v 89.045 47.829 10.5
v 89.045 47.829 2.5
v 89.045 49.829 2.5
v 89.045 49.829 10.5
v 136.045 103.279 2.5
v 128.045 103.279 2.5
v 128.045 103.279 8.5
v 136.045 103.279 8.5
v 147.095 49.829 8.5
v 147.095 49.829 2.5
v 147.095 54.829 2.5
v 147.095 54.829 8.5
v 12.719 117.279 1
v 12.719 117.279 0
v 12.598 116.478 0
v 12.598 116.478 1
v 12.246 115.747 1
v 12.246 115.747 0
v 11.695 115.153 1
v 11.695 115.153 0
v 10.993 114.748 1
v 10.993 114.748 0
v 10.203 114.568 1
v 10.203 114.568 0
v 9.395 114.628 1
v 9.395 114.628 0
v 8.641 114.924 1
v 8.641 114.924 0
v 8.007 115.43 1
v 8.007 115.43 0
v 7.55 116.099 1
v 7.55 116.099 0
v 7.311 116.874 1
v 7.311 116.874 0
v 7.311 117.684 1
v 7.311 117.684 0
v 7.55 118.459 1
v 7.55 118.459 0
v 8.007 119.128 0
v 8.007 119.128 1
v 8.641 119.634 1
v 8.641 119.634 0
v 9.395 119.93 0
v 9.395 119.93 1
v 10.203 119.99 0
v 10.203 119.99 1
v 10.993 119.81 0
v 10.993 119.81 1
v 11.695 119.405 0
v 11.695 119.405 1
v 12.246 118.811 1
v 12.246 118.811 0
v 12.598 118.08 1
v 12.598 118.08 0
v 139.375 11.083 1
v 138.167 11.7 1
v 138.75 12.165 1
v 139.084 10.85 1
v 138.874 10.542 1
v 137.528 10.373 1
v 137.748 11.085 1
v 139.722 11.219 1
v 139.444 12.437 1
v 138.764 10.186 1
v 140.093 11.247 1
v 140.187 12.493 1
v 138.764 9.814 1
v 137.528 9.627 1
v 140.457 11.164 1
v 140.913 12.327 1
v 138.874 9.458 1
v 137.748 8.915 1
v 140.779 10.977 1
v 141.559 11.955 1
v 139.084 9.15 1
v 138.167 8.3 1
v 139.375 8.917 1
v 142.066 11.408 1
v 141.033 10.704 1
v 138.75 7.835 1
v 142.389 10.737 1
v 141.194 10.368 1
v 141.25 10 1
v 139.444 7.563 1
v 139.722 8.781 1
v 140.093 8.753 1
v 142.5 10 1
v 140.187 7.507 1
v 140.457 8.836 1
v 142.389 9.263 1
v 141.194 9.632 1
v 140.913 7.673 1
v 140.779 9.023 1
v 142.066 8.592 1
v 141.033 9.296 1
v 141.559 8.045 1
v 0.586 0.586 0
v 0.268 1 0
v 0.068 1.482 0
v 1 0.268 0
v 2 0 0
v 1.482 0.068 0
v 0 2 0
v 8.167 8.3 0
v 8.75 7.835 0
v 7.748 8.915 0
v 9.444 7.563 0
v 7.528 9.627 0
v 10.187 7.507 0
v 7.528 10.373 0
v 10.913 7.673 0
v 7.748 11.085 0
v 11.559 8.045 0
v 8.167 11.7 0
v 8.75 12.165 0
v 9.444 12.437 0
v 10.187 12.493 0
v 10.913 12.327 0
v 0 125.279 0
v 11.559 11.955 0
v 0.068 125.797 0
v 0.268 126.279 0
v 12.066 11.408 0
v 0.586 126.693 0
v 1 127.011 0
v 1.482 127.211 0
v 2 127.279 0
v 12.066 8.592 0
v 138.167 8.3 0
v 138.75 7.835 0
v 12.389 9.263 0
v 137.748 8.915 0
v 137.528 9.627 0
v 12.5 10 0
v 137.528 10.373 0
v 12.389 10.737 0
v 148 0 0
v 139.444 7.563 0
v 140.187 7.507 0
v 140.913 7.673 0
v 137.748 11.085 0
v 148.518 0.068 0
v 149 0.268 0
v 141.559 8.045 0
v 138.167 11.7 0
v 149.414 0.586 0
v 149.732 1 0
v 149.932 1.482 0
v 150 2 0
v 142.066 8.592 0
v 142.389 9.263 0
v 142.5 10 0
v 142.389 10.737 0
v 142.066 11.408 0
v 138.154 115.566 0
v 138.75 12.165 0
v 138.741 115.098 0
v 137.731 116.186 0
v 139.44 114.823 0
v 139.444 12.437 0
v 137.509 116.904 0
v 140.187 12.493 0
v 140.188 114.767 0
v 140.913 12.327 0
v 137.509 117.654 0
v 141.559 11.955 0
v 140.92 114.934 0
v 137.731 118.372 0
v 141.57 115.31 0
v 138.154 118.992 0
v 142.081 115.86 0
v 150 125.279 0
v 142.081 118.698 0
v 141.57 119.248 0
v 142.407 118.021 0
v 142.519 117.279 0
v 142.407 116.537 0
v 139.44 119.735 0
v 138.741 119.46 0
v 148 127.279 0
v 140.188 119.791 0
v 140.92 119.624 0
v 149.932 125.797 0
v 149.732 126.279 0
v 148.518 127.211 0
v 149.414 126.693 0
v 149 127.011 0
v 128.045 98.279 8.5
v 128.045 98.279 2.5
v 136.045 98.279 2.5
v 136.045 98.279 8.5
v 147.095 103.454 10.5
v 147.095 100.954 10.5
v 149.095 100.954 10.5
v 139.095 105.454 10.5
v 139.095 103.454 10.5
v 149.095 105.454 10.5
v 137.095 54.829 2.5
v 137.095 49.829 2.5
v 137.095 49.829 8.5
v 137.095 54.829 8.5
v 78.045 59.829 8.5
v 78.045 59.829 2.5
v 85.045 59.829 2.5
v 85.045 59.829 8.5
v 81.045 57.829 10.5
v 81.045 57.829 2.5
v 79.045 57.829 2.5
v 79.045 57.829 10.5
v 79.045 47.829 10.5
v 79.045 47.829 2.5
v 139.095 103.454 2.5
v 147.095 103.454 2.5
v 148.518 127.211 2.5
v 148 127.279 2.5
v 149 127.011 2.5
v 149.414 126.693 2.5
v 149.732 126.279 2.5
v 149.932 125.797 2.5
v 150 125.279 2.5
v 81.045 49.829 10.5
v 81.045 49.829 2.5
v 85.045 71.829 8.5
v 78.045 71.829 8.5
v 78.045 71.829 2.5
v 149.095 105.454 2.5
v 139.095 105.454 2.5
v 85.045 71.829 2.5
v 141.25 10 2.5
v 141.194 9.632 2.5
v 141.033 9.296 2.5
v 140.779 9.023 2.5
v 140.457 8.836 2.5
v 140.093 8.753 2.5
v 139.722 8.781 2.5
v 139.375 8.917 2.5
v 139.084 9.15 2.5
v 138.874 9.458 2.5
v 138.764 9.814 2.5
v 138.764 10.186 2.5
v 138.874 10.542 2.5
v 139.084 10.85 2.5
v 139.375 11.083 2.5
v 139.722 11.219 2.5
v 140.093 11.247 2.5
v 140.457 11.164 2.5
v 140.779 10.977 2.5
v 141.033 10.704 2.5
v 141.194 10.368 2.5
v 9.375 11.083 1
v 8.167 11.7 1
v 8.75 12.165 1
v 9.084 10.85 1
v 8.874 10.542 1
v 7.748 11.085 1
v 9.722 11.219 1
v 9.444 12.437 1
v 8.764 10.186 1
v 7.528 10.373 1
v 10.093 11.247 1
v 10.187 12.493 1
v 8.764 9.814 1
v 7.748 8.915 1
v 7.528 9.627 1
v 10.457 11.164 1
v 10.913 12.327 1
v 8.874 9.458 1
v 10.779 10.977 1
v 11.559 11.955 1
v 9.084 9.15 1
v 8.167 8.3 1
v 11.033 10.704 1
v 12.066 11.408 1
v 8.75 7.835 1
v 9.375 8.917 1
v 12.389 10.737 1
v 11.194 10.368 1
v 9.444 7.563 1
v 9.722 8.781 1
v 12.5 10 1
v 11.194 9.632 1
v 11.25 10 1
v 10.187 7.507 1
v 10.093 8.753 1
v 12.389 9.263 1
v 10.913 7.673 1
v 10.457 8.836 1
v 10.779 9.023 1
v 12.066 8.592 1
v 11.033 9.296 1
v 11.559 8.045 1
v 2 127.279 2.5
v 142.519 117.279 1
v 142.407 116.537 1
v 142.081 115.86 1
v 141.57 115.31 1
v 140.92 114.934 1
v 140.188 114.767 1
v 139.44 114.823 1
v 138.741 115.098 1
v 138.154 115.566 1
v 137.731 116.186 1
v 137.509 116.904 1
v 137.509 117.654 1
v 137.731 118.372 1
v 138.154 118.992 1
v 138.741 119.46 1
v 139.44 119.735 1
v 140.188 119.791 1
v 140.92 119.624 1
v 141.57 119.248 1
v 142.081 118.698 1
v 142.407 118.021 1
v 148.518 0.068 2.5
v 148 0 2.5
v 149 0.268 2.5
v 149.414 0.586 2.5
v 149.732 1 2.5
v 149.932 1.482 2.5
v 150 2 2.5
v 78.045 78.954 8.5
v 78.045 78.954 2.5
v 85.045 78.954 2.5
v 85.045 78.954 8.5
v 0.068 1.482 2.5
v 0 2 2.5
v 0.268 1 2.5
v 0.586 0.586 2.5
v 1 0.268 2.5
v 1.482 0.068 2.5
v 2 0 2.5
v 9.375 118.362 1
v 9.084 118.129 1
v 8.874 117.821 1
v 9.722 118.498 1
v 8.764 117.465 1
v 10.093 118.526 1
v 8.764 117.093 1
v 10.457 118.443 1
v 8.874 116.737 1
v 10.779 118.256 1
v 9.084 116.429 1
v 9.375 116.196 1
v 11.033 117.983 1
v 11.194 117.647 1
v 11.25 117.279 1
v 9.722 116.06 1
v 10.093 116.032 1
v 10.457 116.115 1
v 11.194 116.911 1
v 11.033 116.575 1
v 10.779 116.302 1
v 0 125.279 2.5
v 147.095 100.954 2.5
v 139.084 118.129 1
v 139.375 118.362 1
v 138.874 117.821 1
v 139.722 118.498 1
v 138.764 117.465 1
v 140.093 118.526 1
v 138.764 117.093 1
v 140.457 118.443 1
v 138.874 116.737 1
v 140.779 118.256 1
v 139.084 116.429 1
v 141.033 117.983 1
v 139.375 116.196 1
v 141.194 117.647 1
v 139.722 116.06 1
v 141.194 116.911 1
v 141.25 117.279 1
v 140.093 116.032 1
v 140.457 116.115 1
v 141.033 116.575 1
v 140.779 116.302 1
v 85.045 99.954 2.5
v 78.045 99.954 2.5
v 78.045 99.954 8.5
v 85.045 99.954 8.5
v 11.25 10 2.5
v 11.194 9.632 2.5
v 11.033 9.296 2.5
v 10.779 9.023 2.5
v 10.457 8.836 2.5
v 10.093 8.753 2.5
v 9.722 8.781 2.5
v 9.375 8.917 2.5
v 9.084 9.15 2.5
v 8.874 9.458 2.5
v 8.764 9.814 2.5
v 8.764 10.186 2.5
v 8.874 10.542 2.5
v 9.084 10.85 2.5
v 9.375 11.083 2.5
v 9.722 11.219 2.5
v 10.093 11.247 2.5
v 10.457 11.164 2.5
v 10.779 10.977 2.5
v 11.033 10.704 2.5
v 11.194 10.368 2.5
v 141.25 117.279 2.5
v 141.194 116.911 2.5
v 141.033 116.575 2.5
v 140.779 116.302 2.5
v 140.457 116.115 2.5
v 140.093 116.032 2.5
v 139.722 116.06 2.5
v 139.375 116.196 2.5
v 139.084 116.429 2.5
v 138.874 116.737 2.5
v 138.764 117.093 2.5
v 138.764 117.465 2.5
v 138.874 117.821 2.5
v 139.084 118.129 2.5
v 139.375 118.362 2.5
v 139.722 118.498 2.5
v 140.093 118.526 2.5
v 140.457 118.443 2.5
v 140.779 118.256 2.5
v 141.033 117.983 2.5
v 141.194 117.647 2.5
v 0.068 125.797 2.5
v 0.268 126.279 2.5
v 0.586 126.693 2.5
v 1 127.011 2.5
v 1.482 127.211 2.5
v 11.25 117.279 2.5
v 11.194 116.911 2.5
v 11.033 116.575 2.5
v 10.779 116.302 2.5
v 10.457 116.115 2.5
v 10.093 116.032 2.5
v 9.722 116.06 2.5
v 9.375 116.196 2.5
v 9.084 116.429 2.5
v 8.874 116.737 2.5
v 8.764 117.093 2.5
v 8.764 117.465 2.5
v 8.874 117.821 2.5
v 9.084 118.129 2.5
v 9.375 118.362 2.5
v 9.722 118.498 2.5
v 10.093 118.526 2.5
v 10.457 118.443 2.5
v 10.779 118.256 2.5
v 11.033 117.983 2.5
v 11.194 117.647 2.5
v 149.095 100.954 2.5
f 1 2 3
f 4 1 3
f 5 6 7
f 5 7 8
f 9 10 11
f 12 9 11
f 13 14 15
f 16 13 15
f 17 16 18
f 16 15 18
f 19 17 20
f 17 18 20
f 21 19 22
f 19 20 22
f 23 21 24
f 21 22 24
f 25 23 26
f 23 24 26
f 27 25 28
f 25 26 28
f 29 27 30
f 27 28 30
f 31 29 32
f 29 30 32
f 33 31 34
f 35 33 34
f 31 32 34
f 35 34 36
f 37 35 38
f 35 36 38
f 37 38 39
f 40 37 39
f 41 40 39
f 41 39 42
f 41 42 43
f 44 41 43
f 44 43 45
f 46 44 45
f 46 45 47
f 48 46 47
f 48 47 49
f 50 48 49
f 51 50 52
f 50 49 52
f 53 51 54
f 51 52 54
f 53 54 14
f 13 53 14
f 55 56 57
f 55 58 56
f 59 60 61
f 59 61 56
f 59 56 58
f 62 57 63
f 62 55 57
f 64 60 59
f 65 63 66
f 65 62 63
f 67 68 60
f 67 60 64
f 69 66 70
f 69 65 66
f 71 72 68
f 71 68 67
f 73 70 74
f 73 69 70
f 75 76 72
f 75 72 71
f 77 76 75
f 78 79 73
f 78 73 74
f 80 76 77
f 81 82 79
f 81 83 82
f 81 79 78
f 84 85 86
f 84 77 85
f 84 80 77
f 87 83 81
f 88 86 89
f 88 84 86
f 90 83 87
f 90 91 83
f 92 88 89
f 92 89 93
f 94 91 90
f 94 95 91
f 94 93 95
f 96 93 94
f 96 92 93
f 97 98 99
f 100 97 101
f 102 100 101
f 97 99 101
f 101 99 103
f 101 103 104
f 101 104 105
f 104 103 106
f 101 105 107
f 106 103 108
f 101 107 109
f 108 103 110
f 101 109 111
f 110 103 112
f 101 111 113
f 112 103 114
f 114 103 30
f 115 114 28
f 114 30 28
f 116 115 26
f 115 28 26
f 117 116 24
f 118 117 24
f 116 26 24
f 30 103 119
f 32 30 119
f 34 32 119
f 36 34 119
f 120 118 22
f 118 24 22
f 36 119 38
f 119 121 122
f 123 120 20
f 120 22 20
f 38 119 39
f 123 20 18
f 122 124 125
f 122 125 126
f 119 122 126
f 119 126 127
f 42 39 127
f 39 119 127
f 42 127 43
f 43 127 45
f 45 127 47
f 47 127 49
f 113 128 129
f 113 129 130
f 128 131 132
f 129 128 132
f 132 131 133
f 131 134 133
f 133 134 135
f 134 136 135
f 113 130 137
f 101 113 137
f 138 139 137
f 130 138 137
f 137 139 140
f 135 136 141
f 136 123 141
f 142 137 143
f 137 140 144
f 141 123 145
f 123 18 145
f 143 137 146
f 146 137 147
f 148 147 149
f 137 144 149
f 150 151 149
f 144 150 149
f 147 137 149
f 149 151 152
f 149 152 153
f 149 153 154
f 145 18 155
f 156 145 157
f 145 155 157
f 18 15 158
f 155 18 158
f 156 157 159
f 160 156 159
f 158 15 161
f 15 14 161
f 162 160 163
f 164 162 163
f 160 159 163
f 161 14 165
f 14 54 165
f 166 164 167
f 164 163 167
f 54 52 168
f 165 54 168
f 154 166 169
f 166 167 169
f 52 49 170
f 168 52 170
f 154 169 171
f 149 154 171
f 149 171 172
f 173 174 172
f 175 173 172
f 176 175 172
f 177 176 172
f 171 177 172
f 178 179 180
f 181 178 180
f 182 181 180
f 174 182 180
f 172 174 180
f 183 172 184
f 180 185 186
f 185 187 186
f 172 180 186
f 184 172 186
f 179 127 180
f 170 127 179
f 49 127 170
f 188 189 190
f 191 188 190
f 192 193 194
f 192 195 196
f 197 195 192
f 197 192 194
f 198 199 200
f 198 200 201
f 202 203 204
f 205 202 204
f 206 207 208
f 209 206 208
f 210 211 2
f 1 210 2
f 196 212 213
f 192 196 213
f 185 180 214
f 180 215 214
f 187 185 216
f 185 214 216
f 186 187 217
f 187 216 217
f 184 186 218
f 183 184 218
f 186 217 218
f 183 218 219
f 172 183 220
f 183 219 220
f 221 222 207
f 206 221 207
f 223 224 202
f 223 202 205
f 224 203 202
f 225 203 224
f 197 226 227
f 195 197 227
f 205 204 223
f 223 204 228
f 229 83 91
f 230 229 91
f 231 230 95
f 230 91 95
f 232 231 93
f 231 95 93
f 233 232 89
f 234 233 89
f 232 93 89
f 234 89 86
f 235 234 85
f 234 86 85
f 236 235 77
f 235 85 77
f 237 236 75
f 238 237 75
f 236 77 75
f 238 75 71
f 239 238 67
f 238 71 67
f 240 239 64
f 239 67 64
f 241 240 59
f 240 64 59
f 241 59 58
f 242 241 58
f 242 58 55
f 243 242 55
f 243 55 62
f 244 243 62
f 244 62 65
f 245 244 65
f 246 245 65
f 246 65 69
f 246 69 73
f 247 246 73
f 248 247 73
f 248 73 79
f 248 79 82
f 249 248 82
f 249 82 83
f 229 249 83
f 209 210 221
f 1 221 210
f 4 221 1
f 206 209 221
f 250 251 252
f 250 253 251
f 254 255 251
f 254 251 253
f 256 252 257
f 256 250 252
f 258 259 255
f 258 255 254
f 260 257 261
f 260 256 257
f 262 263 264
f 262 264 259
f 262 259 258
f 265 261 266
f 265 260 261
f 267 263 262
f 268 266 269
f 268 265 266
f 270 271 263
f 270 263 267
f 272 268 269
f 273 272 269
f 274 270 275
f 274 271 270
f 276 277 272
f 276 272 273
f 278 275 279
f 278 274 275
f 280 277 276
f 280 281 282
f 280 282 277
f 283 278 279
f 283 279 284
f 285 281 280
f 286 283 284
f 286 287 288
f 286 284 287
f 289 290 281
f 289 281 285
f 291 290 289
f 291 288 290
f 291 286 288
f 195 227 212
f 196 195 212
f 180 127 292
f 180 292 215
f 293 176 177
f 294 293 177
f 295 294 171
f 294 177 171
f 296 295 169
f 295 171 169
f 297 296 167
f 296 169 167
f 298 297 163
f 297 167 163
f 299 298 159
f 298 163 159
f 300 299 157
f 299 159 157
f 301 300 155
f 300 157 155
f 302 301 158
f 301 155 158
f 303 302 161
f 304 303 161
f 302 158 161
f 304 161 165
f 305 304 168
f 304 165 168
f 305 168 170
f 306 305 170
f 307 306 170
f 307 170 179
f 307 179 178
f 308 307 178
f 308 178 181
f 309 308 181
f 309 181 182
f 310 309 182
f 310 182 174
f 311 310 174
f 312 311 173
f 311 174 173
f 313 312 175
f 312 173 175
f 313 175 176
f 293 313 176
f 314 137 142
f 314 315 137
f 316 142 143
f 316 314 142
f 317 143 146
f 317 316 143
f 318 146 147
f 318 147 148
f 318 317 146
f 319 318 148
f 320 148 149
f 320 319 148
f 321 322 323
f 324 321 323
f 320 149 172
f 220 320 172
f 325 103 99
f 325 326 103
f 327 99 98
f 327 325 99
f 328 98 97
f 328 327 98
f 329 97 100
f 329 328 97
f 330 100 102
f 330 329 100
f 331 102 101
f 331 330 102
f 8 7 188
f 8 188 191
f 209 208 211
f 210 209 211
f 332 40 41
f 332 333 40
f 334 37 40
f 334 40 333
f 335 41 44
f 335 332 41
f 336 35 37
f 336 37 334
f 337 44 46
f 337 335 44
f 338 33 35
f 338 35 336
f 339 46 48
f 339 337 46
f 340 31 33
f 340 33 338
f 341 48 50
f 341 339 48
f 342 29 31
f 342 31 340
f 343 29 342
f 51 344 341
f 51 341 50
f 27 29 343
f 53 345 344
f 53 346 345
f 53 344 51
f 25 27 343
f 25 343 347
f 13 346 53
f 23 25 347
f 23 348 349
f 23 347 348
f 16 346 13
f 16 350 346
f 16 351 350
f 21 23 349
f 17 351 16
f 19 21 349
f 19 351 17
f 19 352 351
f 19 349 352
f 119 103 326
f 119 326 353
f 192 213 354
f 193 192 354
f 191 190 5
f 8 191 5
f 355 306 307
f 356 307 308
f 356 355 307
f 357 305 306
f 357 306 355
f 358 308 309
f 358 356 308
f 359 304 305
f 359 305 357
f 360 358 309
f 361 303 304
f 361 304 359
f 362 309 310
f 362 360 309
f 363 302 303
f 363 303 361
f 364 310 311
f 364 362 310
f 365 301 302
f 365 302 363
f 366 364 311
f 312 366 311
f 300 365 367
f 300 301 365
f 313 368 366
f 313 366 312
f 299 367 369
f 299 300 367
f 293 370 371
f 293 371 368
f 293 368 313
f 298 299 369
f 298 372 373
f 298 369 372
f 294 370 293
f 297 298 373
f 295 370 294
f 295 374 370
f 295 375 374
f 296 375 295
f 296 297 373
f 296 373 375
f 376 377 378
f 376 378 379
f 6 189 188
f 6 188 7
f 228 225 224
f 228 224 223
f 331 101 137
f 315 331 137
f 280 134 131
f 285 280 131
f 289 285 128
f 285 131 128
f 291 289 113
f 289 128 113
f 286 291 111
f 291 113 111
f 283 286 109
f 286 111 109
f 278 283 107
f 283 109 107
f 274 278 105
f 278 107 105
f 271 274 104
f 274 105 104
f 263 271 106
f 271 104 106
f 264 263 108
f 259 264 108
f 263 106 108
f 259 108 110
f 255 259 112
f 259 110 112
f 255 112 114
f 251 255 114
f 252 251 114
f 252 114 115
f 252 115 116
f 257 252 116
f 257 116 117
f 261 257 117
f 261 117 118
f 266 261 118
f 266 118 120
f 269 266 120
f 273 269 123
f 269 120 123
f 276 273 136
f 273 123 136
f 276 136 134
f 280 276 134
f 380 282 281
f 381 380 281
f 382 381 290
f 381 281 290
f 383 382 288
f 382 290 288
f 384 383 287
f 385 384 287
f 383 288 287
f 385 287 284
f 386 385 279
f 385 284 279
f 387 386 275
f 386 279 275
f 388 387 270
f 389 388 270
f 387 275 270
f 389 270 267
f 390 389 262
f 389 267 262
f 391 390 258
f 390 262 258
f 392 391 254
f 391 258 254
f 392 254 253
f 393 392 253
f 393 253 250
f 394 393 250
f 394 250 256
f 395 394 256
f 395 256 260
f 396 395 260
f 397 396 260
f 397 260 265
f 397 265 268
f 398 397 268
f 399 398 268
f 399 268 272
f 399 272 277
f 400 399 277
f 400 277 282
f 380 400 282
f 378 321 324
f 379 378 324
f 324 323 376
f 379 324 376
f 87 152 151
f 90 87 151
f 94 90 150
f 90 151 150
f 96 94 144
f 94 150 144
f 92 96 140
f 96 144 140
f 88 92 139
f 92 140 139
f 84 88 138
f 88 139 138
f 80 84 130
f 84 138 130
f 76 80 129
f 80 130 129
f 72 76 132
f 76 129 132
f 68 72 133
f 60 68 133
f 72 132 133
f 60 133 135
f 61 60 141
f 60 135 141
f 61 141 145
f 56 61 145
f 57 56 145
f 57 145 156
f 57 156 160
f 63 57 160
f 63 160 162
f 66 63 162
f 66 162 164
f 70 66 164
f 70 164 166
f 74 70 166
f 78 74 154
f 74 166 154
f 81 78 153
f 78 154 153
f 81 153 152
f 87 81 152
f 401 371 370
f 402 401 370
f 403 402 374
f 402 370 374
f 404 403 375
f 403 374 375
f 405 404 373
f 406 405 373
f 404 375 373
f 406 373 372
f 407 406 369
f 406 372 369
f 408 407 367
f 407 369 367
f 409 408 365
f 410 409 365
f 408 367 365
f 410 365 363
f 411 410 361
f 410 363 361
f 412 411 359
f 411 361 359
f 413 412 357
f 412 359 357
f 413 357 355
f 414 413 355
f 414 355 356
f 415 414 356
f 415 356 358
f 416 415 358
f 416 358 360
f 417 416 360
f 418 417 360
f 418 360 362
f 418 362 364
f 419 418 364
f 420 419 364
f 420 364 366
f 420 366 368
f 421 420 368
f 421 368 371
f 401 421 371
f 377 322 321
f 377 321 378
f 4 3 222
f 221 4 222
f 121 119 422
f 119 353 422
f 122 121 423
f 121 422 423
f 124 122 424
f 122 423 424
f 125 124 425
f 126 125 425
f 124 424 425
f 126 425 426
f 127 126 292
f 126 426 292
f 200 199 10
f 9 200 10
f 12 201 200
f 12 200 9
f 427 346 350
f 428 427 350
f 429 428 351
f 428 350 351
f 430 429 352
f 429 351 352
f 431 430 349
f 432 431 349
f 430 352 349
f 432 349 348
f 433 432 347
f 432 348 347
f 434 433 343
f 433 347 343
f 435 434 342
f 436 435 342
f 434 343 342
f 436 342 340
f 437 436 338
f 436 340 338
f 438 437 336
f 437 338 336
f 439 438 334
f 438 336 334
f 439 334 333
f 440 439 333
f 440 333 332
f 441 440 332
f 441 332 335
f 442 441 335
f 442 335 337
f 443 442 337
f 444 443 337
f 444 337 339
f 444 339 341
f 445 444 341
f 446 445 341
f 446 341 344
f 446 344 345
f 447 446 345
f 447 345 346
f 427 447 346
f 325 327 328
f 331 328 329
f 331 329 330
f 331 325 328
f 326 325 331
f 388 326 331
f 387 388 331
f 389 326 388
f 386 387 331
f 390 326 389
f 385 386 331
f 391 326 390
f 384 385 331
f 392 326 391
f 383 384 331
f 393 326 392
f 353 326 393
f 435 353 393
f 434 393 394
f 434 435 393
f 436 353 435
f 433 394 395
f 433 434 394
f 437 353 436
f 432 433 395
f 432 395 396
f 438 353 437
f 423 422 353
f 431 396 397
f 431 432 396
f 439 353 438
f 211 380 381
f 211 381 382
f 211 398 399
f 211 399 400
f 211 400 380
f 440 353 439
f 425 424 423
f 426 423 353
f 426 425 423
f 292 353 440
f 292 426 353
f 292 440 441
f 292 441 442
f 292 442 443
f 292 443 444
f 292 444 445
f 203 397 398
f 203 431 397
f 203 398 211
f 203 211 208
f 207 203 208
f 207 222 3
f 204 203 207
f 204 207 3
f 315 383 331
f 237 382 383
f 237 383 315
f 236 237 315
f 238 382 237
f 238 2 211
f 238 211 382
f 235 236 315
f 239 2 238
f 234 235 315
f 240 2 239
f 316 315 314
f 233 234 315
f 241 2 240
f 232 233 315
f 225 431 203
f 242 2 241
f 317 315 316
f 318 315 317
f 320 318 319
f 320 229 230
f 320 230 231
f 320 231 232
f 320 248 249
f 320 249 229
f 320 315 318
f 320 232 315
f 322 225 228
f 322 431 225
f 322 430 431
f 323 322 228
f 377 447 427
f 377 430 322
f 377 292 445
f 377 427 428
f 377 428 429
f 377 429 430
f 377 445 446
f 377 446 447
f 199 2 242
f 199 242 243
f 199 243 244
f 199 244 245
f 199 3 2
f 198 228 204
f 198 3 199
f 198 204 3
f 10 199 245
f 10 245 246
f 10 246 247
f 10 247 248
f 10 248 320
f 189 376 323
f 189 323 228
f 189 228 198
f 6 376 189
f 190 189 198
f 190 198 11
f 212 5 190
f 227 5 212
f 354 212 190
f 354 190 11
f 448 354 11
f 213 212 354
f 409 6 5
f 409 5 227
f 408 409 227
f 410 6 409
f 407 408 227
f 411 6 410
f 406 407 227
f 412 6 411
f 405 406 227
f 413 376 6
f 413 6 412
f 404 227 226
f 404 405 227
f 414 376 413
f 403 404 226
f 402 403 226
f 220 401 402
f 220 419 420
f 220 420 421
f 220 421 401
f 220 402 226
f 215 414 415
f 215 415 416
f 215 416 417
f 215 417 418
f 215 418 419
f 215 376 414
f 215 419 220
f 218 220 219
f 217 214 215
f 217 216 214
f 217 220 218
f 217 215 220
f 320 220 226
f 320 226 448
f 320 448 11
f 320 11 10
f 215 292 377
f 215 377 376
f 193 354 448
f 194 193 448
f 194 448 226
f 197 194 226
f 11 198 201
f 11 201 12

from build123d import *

# Parameters (mm, degrees)
F0_W      = 150
F0_H      = 127.279
F1_DEPTH  = 2.5
F2_R      = 2.5
F2_R_2    = 2.718932
F2_R_3    = 2.518659
F3_DEPTH  = 1
F4_R      = 1.25
F5_DEPTH  = 1.501
F6_R      = 2
F8_DEPTH  = 8
F9_W      = 7
F9_H      = 12
F9_H_2    = 21
F9_W_2    = 8
F9_H_3    = 5
F10_DEPTH = 6
F11_W     = 10
F11_H     = 5
F12_DEPTH = 6


with BuildPart() as f1:
    # F0 (on Top) → F1 (new body)
    with BuildSketch(Plane.XY):
        with Locations((75, 63.6395)):
            Rectangle(F0_W, F0_H)
    extrude(amount=F1_DEPTH)

    # F2 (on face) → F3 (cut)
    with BuildSketch(Plane(origin=(0, 0, 0), x_dir=(1, 0, 0), z_dir=(0, 0, -1))):
        with Locations((10, -10)):
            Circle(F2_R)
        with Locations((140, -10)):
            Circle(F2_R)
        with Locations((10, -117.279)):
            Circle(F2_R_2)
        with Locations((140, -117.279)):
            Circle(F2_R_3)
    extrude(amount=-F3_DEPTH, mode=Mode.SUBTRACT)

    # F4 (on face) → F5 (cut, through all)
    with BuildSketch(Plane(origin=(0, 0, 1), x_dir=(1, 0, 0), z_dir=(0, 0, -1))):
        with Locations((10, -10)):
            Circle(F4_R)
        with Locations((10, -117.279)):
            Circle(F4_R)
        with Locations((140, -117.279)):
            Circle(F4_R)
        with Locations((140, -10)):
            Circle(F4_R)
    extrude(amount=-F5_DEPTH, mode=Mode.SUBTRACT)

    # F6
    f6_edges = [f1.edges().sort_by_distance(p)[0] for p in [
        (150, 0, 1.25),
        (0, 0, 1.25),
        (150, 127.279, 1.25),
        (0, 127.279, 1.25),
    ]]
    fillet(f6_edges, radius=F6_R)

    # F7 (on face) → F8 (join)
    with BuildSketch(Plane.XY.offset(2.5)):
        Polygon((89.045, 49.829), (81.045, 49.829), (81.045, 57.829), (79.045, 57.829), (79.045, 47.829), (89.045, 47.829), align=None)
        Polygon((139.095, 103.454), (147.095, 103.454), (147.095, 100.954), (149.095, 100.954), (149.095, 105.454), (139.095, 105.454), align=None)
    extrude(amount=F8_DEPTH)

    # F9 (on face) → F10 (join)
    with BuildSketch(Plane.XY.offset(2.5)):
        with Locations((81.545, 65.829)):
            Rectangle(F9_W, F9_H)
        with Locations((81.545, 89.454)):
            Rectangle(F9_W, F9_H_2)
        with Locations((132.045, 100.779)):
            Rectangle(F9_W_2, F9_H_3)
    extrude(amount=F10_DEPTH)

    # F11 (on face) → F12 (join)
    with BuildSketch(Plane.XY.offset(2.5)):
        with Locations((142.095, 52.329)):
            Rectangle(F11_W, F11_H)
    extrude(amount=F12_DEPTH)


solid = f1.part
